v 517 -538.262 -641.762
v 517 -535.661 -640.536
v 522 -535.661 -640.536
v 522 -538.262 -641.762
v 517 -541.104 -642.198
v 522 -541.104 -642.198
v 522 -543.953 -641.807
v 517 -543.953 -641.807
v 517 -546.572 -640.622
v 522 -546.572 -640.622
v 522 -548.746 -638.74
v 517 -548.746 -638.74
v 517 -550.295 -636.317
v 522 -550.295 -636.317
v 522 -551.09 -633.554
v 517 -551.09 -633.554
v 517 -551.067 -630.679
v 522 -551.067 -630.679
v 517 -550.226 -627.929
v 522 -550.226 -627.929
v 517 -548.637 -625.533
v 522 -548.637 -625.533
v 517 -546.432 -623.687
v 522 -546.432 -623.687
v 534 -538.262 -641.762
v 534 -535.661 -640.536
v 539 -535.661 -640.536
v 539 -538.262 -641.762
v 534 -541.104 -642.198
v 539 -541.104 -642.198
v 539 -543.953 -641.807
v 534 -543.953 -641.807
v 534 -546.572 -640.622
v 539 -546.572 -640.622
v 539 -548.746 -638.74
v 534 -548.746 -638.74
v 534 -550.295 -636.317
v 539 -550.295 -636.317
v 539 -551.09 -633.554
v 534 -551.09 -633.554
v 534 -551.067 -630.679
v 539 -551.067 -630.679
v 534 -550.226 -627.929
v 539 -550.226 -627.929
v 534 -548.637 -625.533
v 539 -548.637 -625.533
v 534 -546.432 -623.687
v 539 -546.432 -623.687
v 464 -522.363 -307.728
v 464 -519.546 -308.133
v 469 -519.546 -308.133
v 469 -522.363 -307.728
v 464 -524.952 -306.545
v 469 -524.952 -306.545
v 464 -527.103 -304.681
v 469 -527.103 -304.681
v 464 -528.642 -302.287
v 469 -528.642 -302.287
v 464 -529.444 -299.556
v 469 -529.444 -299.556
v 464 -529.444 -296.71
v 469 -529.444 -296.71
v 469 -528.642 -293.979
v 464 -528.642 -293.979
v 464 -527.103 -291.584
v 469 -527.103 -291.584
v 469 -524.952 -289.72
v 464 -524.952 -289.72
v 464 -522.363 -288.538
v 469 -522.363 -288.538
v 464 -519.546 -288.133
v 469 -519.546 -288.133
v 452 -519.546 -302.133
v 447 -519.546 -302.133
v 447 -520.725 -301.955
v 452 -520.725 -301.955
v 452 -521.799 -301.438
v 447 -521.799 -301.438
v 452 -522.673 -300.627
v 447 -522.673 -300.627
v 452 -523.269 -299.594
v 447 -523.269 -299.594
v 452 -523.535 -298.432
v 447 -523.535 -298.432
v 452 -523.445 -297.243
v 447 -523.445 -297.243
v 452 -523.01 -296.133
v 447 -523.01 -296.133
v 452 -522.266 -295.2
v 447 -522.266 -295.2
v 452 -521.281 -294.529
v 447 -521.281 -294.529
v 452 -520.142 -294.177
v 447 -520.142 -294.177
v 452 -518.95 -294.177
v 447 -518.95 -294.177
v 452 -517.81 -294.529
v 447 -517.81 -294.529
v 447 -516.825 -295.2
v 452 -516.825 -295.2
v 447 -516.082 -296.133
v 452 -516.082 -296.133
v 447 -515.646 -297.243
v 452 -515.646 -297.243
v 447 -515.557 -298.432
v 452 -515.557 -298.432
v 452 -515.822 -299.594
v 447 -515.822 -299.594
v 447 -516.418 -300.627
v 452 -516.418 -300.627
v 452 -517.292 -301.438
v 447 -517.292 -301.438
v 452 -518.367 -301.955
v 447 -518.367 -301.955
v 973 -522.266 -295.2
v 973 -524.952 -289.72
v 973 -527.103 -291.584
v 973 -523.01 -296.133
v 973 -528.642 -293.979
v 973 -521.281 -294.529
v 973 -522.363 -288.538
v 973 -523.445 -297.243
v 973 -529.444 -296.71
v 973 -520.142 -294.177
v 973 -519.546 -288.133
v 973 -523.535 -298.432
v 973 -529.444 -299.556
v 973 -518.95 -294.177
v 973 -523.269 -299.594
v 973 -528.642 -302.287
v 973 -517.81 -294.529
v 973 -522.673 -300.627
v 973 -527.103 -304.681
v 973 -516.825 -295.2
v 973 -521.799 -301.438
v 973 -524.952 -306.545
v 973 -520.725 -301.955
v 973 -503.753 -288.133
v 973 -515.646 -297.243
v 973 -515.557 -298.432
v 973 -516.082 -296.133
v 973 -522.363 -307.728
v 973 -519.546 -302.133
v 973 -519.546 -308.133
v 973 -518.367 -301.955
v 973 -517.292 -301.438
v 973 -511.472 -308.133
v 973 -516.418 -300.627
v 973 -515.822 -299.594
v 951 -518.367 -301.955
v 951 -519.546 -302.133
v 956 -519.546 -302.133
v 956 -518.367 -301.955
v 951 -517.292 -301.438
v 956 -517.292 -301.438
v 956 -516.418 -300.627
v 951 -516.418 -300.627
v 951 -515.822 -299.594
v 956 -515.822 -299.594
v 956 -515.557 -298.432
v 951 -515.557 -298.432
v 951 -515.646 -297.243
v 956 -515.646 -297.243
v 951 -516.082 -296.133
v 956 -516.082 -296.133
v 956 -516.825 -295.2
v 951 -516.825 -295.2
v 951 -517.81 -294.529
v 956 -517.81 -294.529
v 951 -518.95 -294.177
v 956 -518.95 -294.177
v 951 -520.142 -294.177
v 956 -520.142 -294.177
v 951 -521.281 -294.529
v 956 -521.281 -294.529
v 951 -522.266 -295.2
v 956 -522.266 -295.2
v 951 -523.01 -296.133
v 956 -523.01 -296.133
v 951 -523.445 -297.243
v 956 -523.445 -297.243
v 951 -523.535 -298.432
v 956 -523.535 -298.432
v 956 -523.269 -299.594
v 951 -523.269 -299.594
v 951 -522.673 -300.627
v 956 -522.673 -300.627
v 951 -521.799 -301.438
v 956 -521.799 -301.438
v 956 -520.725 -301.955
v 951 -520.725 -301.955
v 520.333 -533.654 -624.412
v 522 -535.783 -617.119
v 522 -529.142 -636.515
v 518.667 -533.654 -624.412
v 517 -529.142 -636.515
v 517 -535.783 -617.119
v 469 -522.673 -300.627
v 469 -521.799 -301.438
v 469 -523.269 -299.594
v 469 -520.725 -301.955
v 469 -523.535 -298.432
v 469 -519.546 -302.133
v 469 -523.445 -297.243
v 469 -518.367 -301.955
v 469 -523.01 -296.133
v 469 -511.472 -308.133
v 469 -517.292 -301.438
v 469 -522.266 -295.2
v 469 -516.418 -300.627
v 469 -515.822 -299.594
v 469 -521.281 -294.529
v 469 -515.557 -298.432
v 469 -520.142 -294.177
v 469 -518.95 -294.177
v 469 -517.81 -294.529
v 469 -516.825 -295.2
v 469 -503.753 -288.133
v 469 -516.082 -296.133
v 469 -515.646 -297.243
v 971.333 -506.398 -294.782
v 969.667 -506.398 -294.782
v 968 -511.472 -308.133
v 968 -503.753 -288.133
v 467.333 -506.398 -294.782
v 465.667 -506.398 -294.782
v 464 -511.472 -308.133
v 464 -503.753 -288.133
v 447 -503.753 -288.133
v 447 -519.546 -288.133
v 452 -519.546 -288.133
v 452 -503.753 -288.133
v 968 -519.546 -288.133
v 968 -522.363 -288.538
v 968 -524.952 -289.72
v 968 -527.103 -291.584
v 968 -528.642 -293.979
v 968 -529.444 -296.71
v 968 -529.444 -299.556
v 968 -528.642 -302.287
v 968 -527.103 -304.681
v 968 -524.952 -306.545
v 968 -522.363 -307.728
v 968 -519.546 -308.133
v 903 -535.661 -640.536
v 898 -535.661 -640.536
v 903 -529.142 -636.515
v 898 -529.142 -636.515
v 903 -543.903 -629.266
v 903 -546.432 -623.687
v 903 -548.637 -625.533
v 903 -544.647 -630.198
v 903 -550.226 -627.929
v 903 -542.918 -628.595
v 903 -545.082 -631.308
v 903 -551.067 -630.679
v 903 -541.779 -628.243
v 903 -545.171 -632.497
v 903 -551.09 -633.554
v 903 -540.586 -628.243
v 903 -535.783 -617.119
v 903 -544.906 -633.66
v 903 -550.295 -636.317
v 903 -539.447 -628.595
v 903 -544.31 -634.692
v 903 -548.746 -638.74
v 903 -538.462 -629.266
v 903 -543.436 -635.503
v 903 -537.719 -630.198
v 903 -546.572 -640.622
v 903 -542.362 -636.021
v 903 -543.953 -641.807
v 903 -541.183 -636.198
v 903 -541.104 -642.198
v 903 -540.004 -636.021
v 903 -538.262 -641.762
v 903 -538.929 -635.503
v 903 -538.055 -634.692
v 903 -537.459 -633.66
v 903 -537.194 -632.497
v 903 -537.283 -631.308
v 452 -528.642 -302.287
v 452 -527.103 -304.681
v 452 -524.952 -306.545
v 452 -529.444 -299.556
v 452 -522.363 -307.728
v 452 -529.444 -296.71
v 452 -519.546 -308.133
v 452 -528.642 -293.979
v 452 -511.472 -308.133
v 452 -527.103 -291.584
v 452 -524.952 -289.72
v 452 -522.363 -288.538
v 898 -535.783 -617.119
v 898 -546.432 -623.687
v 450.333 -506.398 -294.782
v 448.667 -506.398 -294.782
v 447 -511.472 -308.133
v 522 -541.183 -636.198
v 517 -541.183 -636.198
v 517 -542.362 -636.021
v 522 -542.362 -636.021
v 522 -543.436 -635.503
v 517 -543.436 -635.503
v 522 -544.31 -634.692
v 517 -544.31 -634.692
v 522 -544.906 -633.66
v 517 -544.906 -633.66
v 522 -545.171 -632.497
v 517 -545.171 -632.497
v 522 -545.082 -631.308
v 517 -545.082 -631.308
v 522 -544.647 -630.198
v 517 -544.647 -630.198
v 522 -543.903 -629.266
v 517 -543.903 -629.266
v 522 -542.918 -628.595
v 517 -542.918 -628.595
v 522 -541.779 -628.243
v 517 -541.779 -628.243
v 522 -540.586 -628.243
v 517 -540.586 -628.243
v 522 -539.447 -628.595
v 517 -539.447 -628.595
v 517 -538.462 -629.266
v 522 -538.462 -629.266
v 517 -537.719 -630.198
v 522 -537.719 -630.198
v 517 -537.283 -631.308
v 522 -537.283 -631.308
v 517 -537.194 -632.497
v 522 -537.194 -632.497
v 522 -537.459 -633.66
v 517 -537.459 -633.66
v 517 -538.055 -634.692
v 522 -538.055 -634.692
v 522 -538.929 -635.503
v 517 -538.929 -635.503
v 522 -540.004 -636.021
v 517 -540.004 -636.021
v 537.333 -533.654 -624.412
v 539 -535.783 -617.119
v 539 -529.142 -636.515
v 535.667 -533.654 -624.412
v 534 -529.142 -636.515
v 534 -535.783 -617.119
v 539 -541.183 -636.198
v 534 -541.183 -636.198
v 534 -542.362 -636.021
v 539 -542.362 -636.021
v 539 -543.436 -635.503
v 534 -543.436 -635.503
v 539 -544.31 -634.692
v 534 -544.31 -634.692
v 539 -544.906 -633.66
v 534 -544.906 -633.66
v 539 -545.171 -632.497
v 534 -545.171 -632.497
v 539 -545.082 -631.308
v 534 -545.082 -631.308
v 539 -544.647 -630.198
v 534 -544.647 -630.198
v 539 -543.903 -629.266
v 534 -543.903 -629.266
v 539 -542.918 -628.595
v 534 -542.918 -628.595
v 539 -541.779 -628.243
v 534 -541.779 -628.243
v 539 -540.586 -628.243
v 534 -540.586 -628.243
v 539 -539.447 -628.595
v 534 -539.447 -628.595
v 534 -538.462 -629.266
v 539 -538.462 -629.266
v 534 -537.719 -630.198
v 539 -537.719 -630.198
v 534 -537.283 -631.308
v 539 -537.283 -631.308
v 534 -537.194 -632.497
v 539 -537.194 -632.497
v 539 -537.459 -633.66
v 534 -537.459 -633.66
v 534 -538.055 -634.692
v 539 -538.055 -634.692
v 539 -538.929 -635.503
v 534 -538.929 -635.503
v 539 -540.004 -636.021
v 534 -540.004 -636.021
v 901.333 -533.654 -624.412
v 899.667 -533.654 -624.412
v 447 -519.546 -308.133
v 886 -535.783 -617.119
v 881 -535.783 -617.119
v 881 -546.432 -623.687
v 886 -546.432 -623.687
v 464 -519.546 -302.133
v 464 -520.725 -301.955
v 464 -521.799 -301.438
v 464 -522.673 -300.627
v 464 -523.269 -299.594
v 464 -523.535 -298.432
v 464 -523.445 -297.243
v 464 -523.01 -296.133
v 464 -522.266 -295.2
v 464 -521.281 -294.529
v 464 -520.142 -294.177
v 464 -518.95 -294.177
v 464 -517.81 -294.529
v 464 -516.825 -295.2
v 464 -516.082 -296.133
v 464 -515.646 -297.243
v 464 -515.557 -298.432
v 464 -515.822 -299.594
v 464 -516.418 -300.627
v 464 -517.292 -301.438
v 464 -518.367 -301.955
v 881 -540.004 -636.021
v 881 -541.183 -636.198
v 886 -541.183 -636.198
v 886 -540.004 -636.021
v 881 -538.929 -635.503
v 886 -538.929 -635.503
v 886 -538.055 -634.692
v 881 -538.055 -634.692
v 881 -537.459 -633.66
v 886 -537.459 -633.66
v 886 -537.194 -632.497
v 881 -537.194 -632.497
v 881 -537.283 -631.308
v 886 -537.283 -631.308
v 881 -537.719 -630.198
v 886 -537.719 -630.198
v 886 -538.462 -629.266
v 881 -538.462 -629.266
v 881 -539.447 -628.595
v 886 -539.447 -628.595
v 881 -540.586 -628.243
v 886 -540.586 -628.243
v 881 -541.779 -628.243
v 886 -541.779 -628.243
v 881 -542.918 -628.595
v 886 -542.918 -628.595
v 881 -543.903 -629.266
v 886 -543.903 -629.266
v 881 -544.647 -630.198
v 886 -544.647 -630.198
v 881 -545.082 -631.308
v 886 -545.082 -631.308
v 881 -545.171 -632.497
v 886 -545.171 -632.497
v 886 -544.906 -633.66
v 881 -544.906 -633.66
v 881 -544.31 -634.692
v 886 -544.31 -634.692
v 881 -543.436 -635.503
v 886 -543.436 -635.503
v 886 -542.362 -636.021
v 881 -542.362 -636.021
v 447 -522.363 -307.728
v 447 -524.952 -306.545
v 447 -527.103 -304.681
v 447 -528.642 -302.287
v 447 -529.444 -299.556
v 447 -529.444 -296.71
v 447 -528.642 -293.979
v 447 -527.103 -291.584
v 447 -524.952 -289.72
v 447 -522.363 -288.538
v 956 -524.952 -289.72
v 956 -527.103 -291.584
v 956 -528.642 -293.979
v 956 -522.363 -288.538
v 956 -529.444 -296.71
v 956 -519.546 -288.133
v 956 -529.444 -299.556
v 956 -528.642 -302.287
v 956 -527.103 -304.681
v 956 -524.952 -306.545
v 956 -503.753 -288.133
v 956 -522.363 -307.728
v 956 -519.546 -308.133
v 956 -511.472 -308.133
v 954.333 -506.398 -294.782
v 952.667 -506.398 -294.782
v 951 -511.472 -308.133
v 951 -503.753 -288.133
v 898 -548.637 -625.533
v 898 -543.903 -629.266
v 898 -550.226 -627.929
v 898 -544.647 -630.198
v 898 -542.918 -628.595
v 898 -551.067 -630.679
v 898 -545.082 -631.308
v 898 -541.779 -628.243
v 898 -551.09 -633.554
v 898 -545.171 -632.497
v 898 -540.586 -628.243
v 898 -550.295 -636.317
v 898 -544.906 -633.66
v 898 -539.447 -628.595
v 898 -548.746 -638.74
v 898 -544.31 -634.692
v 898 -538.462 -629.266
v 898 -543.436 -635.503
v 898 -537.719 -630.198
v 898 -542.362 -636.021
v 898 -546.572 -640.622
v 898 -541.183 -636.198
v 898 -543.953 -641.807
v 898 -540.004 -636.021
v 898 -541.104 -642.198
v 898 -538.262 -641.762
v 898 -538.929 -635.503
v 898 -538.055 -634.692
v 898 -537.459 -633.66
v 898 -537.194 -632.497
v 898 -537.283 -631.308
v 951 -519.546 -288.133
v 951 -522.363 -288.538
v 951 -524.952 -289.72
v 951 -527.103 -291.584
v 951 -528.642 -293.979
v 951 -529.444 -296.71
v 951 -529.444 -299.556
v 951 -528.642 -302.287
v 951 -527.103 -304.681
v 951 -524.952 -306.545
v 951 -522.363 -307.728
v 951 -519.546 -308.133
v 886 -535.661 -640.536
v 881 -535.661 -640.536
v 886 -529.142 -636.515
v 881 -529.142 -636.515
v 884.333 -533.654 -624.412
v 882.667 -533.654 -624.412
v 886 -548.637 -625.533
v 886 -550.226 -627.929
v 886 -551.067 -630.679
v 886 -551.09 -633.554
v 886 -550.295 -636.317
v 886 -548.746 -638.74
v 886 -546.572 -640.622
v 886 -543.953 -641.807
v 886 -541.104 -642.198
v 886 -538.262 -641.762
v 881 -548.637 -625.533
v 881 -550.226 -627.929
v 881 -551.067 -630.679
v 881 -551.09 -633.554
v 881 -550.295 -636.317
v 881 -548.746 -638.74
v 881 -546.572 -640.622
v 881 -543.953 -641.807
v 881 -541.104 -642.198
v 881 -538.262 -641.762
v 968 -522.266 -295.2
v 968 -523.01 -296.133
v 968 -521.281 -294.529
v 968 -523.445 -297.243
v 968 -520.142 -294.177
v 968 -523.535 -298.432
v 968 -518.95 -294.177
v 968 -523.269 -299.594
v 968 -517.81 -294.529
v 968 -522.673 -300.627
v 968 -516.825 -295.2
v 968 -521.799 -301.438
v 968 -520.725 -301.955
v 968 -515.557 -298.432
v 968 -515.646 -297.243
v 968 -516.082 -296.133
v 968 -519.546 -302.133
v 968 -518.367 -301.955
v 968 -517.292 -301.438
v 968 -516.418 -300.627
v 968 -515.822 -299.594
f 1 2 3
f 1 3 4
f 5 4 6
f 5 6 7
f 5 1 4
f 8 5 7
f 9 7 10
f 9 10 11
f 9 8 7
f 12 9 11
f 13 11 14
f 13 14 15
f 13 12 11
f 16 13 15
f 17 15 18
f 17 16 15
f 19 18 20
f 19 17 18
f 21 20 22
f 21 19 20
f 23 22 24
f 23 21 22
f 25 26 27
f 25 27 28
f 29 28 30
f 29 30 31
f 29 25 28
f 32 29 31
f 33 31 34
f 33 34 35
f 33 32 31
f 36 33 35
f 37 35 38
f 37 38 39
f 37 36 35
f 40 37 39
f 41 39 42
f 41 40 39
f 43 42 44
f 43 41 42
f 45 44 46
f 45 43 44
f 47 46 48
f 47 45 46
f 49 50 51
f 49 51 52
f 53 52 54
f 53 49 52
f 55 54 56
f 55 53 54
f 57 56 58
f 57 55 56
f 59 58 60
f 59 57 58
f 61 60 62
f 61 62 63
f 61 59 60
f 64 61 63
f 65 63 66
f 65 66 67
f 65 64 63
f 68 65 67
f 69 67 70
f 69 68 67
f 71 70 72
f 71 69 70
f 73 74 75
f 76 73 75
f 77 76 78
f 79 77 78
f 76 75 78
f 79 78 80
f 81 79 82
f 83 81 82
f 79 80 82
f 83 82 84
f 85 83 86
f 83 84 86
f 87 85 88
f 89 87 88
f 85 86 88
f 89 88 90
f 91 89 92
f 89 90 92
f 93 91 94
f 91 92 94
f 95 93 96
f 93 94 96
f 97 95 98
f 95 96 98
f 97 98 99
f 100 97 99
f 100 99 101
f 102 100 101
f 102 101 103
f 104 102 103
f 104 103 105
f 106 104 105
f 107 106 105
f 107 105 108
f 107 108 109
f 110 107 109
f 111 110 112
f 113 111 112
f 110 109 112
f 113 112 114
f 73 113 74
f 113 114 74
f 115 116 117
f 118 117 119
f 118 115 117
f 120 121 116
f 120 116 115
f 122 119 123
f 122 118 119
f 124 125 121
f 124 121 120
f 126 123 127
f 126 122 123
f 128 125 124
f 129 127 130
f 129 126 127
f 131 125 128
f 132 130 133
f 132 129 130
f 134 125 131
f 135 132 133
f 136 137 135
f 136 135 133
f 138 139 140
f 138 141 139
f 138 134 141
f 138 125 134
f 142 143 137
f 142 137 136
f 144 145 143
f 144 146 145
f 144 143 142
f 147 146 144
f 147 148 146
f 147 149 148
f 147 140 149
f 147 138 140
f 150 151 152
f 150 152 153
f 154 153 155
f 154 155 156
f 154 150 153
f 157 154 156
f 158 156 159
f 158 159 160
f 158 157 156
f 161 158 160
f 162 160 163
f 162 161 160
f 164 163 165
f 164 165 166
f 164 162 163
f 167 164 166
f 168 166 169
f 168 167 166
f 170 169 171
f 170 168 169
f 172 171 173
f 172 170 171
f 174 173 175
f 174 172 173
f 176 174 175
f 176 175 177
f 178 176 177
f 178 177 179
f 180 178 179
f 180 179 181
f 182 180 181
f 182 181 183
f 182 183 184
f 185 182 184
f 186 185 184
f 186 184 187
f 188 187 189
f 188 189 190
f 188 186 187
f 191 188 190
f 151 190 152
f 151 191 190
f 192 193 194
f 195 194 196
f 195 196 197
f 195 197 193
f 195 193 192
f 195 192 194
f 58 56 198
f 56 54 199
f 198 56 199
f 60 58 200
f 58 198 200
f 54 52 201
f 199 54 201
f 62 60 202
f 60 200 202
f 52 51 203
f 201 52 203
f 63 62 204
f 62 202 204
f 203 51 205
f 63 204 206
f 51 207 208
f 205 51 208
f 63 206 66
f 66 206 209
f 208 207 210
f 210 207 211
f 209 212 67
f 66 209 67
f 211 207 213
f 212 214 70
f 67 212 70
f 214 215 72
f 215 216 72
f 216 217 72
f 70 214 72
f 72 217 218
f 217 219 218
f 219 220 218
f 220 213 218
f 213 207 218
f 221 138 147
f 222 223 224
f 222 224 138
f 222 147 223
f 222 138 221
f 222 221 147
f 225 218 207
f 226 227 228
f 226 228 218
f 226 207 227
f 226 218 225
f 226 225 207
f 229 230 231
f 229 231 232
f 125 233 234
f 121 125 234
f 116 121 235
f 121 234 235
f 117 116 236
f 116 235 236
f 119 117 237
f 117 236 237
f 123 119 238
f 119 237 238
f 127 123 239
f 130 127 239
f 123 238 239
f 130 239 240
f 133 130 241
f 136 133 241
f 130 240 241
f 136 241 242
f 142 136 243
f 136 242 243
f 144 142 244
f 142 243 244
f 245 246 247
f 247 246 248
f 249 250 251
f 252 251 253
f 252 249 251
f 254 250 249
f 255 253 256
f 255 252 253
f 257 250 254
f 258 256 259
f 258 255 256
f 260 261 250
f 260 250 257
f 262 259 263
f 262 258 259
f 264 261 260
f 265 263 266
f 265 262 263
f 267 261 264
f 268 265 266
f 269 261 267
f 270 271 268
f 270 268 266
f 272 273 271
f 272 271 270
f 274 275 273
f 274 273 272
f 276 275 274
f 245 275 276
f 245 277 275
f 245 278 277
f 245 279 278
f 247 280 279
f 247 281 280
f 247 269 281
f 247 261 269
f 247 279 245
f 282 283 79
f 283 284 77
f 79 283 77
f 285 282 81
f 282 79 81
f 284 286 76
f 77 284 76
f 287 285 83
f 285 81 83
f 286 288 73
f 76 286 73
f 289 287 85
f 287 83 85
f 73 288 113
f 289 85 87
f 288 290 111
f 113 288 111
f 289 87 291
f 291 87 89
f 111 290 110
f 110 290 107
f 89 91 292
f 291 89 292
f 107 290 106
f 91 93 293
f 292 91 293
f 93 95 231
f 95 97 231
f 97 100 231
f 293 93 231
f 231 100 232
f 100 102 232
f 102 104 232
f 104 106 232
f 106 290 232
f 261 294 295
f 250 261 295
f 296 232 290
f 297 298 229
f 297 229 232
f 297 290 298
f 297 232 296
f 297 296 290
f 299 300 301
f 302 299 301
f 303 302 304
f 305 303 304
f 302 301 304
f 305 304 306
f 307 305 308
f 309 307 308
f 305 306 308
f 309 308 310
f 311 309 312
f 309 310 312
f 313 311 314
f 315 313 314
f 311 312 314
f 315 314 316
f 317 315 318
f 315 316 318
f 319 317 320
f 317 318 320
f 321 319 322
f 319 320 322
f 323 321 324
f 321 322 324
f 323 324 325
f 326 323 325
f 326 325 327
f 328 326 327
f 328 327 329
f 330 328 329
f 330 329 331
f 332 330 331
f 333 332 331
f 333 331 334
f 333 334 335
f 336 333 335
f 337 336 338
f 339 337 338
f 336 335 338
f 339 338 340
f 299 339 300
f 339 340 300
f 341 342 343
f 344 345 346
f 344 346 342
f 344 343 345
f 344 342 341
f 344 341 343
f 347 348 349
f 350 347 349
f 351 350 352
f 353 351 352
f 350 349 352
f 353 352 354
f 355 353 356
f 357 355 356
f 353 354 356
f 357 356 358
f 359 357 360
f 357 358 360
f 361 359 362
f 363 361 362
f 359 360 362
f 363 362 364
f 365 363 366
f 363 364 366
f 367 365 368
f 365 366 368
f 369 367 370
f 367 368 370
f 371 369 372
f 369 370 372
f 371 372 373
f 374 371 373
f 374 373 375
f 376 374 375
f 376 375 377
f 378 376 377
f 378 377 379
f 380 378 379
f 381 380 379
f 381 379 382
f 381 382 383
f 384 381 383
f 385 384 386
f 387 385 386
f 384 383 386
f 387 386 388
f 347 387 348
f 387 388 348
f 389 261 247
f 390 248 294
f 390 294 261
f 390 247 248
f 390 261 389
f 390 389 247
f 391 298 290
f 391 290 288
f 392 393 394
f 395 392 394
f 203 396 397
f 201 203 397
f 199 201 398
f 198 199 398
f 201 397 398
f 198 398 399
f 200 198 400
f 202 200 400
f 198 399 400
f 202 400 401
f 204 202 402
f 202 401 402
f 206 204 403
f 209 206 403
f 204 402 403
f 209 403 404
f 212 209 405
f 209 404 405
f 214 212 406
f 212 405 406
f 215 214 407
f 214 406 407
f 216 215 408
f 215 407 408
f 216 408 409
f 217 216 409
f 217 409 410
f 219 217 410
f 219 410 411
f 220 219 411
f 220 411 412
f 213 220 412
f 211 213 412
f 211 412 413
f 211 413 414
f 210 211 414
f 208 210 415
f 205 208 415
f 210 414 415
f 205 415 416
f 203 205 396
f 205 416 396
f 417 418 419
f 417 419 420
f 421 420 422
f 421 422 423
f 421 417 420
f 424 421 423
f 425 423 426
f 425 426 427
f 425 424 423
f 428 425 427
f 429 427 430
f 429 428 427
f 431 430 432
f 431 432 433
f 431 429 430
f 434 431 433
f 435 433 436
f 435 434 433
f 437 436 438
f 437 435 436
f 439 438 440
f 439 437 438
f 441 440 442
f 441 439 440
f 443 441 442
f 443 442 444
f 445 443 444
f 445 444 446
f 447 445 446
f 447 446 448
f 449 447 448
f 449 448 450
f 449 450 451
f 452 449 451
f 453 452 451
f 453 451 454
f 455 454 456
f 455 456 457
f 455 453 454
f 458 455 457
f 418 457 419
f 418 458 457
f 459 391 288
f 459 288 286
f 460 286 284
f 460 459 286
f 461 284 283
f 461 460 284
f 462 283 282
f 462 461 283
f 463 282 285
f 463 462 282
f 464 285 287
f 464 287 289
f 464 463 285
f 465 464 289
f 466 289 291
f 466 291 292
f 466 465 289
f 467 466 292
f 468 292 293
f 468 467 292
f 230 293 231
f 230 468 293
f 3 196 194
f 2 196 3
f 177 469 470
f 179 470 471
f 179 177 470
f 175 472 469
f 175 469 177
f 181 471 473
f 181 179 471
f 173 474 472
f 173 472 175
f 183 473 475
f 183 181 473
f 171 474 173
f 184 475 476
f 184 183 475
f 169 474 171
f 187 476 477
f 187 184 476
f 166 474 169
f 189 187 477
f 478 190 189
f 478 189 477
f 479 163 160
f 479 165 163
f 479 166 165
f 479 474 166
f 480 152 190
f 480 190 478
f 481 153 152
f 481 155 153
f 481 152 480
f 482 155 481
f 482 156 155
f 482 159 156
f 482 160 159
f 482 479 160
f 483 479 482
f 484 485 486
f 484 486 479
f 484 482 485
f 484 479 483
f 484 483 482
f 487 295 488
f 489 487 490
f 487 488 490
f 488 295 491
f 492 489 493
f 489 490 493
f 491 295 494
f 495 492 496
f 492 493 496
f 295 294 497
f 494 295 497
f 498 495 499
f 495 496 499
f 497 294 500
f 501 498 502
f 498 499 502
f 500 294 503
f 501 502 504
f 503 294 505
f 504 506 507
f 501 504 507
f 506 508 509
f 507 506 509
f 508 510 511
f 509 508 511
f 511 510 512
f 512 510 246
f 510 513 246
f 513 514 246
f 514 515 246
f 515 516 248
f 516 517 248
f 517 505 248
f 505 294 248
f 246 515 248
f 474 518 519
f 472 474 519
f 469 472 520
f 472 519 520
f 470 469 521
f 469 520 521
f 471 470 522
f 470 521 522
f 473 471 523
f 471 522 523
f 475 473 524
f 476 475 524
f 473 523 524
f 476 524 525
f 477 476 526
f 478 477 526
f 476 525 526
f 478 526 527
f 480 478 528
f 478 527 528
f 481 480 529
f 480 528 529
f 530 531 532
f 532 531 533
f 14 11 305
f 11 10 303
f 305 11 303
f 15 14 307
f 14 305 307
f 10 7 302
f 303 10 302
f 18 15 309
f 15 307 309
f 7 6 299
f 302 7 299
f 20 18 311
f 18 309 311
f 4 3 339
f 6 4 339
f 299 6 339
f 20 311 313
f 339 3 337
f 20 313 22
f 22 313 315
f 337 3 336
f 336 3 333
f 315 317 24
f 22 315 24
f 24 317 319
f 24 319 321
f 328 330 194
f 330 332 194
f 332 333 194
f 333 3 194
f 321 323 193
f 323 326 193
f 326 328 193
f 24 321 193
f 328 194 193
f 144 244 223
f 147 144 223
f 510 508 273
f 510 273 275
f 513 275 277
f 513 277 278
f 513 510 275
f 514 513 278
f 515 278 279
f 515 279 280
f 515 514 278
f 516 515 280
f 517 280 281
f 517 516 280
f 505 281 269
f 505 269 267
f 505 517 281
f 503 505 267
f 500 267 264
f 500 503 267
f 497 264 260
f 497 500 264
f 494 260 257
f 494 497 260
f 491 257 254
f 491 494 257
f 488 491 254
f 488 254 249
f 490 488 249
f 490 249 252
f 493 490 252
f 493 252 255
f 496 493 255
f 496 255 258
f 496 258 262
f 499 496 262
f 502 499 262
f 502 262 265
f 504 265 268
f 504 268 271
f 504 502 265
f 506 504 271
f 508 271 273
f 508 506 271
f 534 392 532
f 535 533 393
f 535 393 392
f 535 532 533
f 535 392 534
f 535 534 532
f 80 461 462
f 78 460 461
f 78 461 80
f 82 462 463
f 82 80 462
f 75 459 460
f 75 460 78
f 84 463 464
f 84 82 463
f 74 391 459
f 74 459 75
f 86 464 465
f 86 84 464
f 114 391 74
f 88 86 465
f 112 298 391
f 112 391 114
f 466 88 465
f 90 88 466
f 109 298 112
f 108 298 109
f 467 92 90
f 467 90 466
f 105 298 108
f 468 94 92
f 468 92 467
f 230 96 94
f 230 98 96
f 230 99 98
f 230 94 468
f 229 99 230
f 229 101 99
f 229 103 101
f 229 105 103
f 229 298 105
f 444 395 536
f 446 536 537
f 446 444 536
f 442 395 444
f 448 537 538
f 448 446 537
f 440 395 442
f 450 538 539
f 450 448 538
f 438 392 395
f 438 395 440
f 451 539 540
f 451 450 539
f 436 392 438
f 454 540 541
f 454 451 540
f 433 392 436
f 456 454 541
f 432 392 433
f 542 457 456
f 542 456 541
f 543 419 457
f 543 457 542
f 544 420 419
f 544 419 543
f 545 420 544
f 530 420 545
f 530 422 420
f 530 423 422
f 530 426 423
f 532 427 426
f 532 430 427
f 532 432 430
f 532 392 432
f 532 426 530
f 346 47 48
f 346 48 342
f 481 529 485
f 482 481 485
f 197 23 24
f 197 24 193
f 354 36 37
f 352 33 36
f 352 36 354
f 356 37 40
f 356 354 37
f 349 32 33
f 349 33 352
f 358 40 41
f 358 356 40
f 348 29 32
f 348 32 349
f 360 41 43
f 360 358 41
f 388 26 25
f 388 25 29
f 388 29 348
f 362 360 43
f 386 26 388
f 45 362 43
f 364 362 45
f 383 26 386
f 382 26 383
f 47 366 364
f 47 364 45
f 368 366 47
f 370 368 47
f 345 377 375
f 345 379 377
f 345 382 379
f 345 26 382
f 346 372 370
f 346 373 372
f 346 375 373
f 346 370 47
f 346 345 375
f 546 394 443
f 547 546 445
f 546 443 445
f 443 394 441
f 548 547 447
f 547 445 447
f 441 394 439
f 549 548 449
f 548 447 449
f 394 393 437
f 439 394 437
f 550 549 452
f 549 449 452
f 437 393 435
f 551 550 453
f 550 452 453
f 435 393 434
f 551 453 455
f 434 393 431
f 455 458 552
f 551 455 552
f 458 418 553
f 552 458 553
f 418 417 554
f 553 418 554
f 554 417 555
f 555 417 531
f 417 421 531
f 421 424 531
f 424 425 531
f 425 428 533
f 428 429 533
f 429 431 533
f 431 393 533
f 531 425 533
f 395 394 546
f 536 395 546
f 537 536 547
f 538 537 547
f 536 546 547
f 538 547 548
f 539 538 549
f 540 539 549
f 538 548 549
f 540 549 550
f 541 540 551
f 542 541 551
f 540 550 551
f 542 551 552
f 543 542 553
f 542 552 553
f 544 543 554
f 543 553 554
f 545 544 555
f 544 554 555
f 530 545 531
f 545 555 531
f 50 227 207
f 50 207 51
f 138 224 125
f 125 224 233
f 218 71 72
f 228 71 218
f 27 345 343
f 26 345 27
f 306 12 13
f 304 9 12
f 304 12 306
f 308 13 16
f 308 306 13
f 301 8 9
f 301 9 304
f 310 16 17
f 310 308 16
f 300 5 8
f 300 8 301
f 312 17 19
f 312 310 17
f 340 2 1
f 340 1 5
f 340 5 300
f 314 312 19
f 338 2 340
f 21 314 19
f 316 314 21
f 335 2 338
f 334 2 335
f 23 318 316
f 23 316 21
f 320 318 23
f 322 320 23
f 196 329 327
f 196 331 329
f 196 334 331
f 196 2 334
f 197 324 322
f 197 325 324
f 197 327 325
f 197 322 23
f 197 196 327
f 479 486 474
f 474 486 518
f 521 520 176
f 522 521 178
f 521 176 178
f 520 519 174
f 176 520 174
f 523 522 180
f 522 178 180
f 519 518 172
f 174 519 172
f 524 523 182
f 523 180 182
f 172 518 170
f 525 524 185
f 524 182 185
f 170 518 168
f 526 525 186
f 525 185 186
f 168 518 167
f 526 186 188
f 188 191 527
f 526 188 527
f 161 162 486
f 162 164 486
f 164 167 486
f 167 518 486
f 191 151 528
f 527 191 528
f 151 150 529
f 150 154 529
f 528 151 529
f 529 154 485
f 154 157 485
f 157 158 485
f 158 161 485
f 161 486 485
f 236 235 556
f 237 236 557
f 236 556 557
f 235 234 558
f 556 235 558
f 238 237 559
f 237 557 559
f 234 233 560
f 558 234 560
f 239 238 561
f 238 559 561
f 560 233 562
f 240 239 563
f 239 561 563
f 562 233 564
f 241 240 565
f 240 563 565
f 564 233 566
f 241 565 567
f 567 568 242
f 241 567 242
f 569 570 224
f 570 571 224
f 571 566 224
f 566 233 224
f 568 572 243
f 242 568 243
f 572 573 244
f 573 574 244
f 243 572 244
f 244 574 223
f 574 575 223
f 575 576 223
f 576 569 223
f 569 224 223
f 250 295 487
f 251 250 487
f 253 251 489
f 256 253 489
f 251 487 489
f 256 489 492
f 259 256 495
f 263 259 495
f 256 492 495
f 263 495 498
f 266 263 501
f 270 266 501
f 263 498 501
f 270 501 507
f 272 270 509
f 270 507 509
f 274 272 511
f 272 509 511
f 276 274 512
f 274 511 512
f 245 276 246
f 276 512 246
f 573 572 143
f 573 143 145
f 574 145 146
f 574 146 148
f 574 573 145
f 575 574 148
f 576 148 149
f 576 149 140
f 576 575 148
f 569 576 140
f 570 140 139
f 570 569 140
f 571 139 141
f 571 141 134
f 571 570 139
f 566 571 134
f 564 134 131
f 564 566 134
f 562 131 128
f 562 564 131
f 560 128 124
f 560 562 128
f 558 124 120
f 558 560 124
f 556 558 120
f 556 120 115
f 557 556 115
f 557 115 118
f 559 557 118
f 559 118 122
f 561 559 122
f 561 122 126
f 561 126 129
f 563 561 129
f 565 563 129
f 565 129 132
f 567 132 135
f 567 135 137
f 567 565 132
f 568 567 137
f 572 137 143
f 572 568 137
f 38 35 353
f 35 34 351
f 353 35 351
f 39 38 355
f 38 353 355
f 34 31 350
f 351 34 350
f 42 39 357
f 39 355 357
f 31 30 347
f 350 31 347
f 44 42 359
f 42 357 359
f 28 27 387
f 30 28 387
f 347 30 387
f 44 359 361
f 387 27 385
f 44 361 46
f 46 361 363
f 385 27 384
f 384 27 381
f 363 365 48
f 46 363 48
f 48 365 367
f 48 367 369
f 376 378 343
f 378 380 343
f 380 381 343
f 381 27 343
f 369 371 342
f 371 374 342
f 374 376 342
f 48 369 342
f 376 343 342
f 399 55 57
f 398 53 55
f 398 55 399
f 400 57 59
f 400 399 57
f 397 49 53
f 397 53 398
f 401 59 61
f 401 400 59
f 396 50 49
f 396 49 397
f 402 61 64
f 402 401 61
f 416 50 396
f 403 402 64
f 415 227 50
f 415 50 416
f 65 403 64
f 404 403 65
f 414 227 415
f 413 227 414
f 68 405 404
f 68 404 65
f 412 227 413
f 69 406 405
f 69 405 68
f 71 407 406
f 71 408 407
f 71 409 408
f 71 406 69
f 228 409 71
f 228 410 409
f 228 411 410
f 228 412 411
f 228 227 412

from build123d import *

# Parameters (mm, degrees)
BOSS_EXTRUDE1_DEPTH  = 10
BOSS_EXTRUDE2_DEPTH  = 1400
SPLIT2_DEPTH         = 10
SKETCH4_R            = 4
BOSS_EXTRUDE3_DEPTH  = 5
BOSS_EXTRUDE4_START  = -5
SKETCH5_R            = 4
BOSS_EXTRUDE4_DEPTH  = 5
BOSS_EXTRUDE5_START  = 5
SKETCH6_R            = 4
BOSS_EXTRUDE5_DEPTH  = 5
SKETCH7_R            = 4
BOSS_EXTRUDE6_DEPTH  = 5
SKETCH8_R            = 4
BOSS_EXTRUDE7_DEPTH  = 5
BOSS_EXTRUDE8_START  = -5
SKETCH9_R            = 4
BOSS_EXTRUDE8_DEPTH  = 5
SKETCH10_R           = 4
BOSS_EXTRUDE9_DEPTH  = 5
BOSS_EXTRUDE10_START = 5
SKETCH11_R           = 4
BOSS_EXTRUDE10_DEPTH = 5
SPLIT3_START         = 10
SPLIT3_DEPTH         = 1400


# Read off the part's stored shape, not the designer's step: Split2, Split3
with BuildPart() as part:
    # Sketch1 → Boss-Extrude1 (new body)
    with BuildSketch(Plane(origin=(0, 0, 0), x_dir=(0, 0, -1), z_dir=(1, 0, 0))):
        with BuildLine():
            Line((0, -39.159060238), (0, -399.159060238))
            ThreePointArc((0, -399.159060238), (2.810766389, -411.83760809), (10.716371709, -422.140393531))
            Line((10.716371709, -422.140393531), (202.227482489, -582.837295953))
            ThreePointArc((202.227482489, -582.837295953), (211.25050648, -588.046741283), (221.51111078, -589.855962659))
            Line((221.51111078, -589.855962659), (671.51111078, -589.855962659))
            ThreePointArc((671.51111078, -589.855962659), (692.724314215, -581.069166095), (701.51111078, -559.855962659))
            Line((701.51111078, -559.855962659), (701.51111078, -369.855962659))
            ThreePointArc((701.51111078, -369.855962659), (700.081380744, -360.705024227), (695.928465834, -352.426310564))
            Line((695.928465834, -352.426310564), (556.491249073, -157.087470131))
            ThreePointArc((556.491249073, -157.087470131), (549.188422732, -149.877866821), (539.883012979, -145.551320648))
            Line((539.883012979, -145.551320648), (37.809118961, -10.19325866))
            ThreePointArc((37.809118961, -10.19325866), (11.755460664, -15.344426409), (0, -39.159060238))
        make_face()
    extrude(amount=BOSS_EXTRUDE1_DEPTH)

    # Sketch2 → Boss-Extrude2 (add)
    with BuildSketch(Plane(origin=(10, 0, 0), x_dir=(0, 0, -1), z_dir=(1, 0, 0))):
        with BuildLine():
            ThreePointArc((626.364411935, -475.947865394), (654.270375926, -492.315038086), (646.133694128, -523.626722446))
            add(Edge.make_bspline(
                [(646.133694128, -523.626722446), (620.265200397, -544.090123727), (324.808789115, -589.015611509), (14.475713482, -342.918185901), (34.207392898, -327.560917886)],
                knots=[0, 0, 0, 0, 0.454280693, 1, 1, 1, 1], degree=3))
            ThreePointArc((34.207392898, -327.560917886), (38.301805286, -326.1553415), (42.396217675, -327.560917886))
            add(Edge.make_bspline(
                [(42.396217675, -327.560917886), (179.998241324, -434.657283692), (369.496171973, -510.067463814), (572.427382245, -482.279425386), (626.364411935, -475.947865394)],
                knots=[0, 0, 0, 0, 0.742688993, 1, 1, 1, 1], degree=3))
        make_face()
        with BuildLine():
            ThreePointArc((66.698936736, -215.359019498), (67.092959072, -208.260098077), (74.202765192, -208.284508838))
            add(Edge.make_bspline(
                [(74.202765192, -208.284508838), (81.149231878, -214.924232147), (316.076431581, -369.790908175), (526.742508558, -357.109499901), (567.085033992, -348.175125638)],
                knots=[0, 0, 0, 0, 0.768435057, 1, 1, 1, 1], degree=3))
            ThreePointArc((567.085033992, -348.175125638), (594.800287265, -365.58541059), (577.755509271, -393.526935767))
            add(Edge.make_bspline(
                [(66.698936736, -215.359019498), (100.320017518, -254.957400328), (300.322217315, -390.035120939), (509.639726303, -410.500517765), (577.755509271, -393.526935767)],
                knots=[0, 0, 0, 0, 0.654710405, 1, 1, 1, 1], degree=3))
        make_face()
        with BuildLine():
            ThreePointArc((92.163413905, -98.198220596), (93.433821546, -92.827514339), (98.829146805, -93.988930122))
            add(Edge.make_bspline(
                [(98.829146805, -93.988930122), (112.622758483, -114.88285895), (192.730208888, -182.13783781), (300.184384568, -194.688304583), (331.179728441, -194.685467652)],
                knots=[0, 0, 0, 0, 0.660882752, 1, 1, 1, 1], degree=3))
            ThreePointArc((331.179728441, -194.685467652), (341.545058852, -204.318697463), (332.693478174, -215.359019498))
            add(Edge.make_bspline(
                [(92.163413905, -98.198220596), (126.325036043, -154.802617957), (226.918714052, -224.562098265), (331.921739283, -215.472572374), (332.693478174, -215.359019498)],
                knots=[0, 0, 0, 0, 0.645739259, 1, 1, 1, 1], degree=3))
        make_face()
    extrude(amount=BOSS_EXTRUDE2_DEPTH)

    # Split2 outline → Split2 (cut)
    with BuildSketch(Plane.YZ):
        with BuildLine():
            ThreePointArc((-157.087470131, -556.491249073), (-149.877866821, -549.188422732), (-145.551320648, -539.883012979))
            Line((-145.551320648, -539.883012979), (-10.19325866, -37.809118961))
            ThreePointArc((-10.19325866, -37.809118961), (-15.344426409, -11.755460664), (-39.159060238, 0))
            Line((-39.159060238, 0), (-399.159060238, 0))
            ThreePointArc((-399.159060238, 0), (-411.83760809, -2.810766389), (-422.140393531, -10.716371709))
            Line((-422.140393531, -10.716371709), (-582.837295953, -202.227482489))
            ThreePointArc((-582.837295953, -202.227482489), (-588.046741283, -211.25050648), (-589.855962659, -221.51111078))
            Line((-589.855962659, -221.51111078), (-589.855962659, -671.51111078))
            ThreePointArc((-589.855962659, -671.51111078), (-581.069166095, -692.724314215), (-559.855962659, -701.51111078))
            Line((-559.855962659, -701.51111078), (-369.855962659, -701.51111078))
            ThreePointArc((-369.855962659, -701.51111078), (-360.705024227, -700.081380744), (-352.426310564, -695.928465834))
            Line((-352.426310564, -695.928465834), (-157.087470131, -556.491249073))
        make_face()
    extrude(amount=SPLIT2_DEPTH, mode=Mode.SUBTRACT)

    # Sketch4 → Boss-Extrude3 (add)
    with BuildSketch(Plane(origin=(968, 0, 0), x_dir=(0, 0, -1), z_dir=(1, 0, 0))):
        with BuildLine():
            Line((288.132678683, -503.125593865), (288.132678683, -519.545737388))
            ThreePointArc((288.132678683, -519.545737388), (298.132678683, -529.545737388), (308.132678683, -519.545737388))
            Line((308.132678683, -519.545737388), (308.132678683, -511.471886152))
            add(Edge.make_bspline(
                [(288.132678683, -503.125593865), (294.10320056, -505.512610704), (308.132678683, -511.471886152)],
                knots=[0, 0, 0, 1, 1, 1], degree=2))
        make_face()
        with Locations((298.132678683, -519.545737388)):
            Circle(SKETCH4_R, mode=Mode.SUBTRACT)
    extrude(amount=BOSS_EXTRUDE3_DEPTH)

    # Sketch5 → Boss-Extrude4 (add)
    with BuildSketch(Plane(origin=(956, 0, 0), x_dir=(0, 0, -1), z_dir=(1, 0, 0)).offset(BOSS_EXTRUDE4_START)):
        with BuildLine():
            Line((288.132678683, -503.125593865), (288.132678683, -519.545737388))
            ThreePointArc((288.132678683, -519.545737388), (298.132678683, -529.545737388), (308.132678683, -519.545737388))
            Line((308.132678683, -519.545737388), (308.132678683, -511.471886152))
            add(Edge.make_bspline(
                [(308.132678683, -511.471886152), (294.103200562, -505.512610705), (288.132678683, -503.125593865)],
                knots=[0, 0, 0, 1, 1, 1], degree=2))
        make_face()
        with Locations((298.132678683, -519.545737388)):
            Circle(SKETCH5_R, mode=Mode.SUBTRACT)
    extrude(amount=BOSS_EXTRUDE4_DEPTH)

    # Sketch6 → Boss-Extrude5 (add)
    with BuildSketch(Plane.ZY.offset(-452).offset(BOSS_EXTRUDE5_START)):
        with BuildLine():
            Line((-288.132678683, -519.545737388), (-288.132678683, -503.125593865))
            add(Edge.make_bspline(
                [(-288.132678683, -503.125593865), (-294.103200562, -505.512610705), (-308.132678683, -511.471886152)],
                knots=[0, 0, 0, 1, 1, 1], degree=2))
            Line((-308.132678683, -511.471886152), (-308.132678683, -519.545737388))
            ThreePointArc((-308.132678683, -519.545737388), (-298.132678683, -529.545737388), (-288.132678683, -519.545737388))
        make_face()
        with Locations(Location((-298.132678683, -519.545737388, 0), (0, 0, 180))):
            Circle(SKETCH6_R, mode=Mode.SUBTRACT)
    extrude(amount=-BOSS_EXTRUDE5_DEPTH)

    # Sketch7 → Boss-Extrude6 (add)
    with BuildSketch(Plane.ZY.offset(-464)):
        with BuildLine():
            Line((-288.132678683, -519.545737388), (-288.132678683, -503.125593865))
            add(Edge.make_bspline(
                [(-288.132678683, -503.125593865), (-294.103200562, -505.512610705), (-308.132678683, -511.471886152)],
                knots=[0, 0, 0, 1, 1, 1], degree=2))
            Line((-308.132678683, -511.471886152), (-308.132678683, -519.545737388))
            ThreePointArc((-308.132678683, -519.545737388), (-298.132678683, -529.545737388), (-288.132678683, -519.545737388))
        make_face()
        with Locations(Location((-298.132678683, -519.545737388, 0), (0, 0, 180))):
            Circle(SKETCH7_R, mode=Mode.SUBTRACT)
    extrude(amount=-BOSS_EXTRUDE6_DEPTH)

    # Sketch8 → Boss-Extrude7 (add)
    with BuildSketch(Plane(origin=(898, 0, 0), x_dir=(0, 0, -1), z_dir=(1, 0, 0))):
        with BuildLine():
            Line((617.1189132, -535.783369671), (623.687203666, -546.432337306))
            ThreePointArc((623.687203666, -546.432337306), (637.584554422, -549.608142918), (640.536054647, -535.661431988))
            Line((640.536054647, -535.661431988), (636.514752084, -529.141817628))
            Line((636.514752084, -529.141817628), (617.1189132, -535.783369671))
        make_face()
        with Locations((632.198402735, -541.182623942)):
            Circle(SKETCH8_R, mode=Mode.SUBTRACT)
    extrude(amount=BOSS_EXTRUDE7_DEPTH)

    # Sketch9 → Boss-Extrude8 (add)
    with BuildSketch(Plane(origin=(886, 0, 0), x_dir=(0, 0, -1), z_dir=(1, 0, 0)).offset(BOSS_EXTRUDE8_START)):
        with BuildLine():
            Line((617.1189132, -535.783369671), (623.687203666, -546.432337306))
            ThreePointArc((623.687203666, -546.432337306), (637.584554422, -549.608142918), (640.536054647, -535.661431988))
            Line((640.536054647, -535.661431988), (636.514752084, -529.141817628))
            Line((636.514752084, -529.141817628), (617.1189132, -535.783369671))
        make_face()
        with Locations((632.198402735, -541.182623942)):
            Circle(SKETCH9_R, mode=Mode.SUBTRACT)
    extrude(amount=BOSS_EXTRUDE8_DEPTH)

    # Sketch10 → Boss-Extrude9 (add)
    with BuildSketch(Plane.ZY.offset(-534)):
        with BuildLine():
            Line((-623.687203666, -546.432337306), (-617.1189132, -535.783369671))
            Line((-617.1189132, -535.783369671), (-636.514752084, -529.141817628))
            Line((-636.514752084, -529.141817628), (-640.536054647, -535.661431988))
            ThreePointArc((-640.536054647, -535.661431988), (-637.584554422, -549.608142918), (-623.687203666, -546.432337306))
        make_face()
        with Locations(Location((-632.198402735, -541.182623942, 0), (0, 0, 180))):
            Circle(SKETCH10_R, mode=Mode.SUBTRACT)
    extrude(amount=-BOSS_EXTRUDE9_DEPTH)

    # Sketch11 → Boss-Extrude10 (add)
    with BuildSketch(Plane.ZY.offset(-522).offset(BOSS_EXTRUDE10_START)):
        with BuildLine():
            Line((-623.687203666, -546.432337306), (-617.1189132, -535.783369671))
            Line((-617.1189132, -535.783369671), (-636.514752084, -529.141817628))
            Line((-636.514752084, -529.141817628), (-640.536054647, -535.661431988))
            ThreePointArc((-640.536054647, -535.661431988), (-637.584554422, -549.608142918), (-623.687203666, -546.432337306))
        make_face()
        with Locations(Location((-632.198402735, -541.182623942, 0), (0, 0, 180))):
            Circle(SKETCH11_R, mode=Mode.SUBTRACT)
    extrude(amount=-BOSS_EXTRUDE10_DEPTH)

    # Split3 outline → Split3 (cut)
    with BuildSketch(Plane.YZ.offset(SPLIT3_START)):
        with BuildLine():
            add(Edge.make_bspline(
                [(-511.471886152, -308.132678683), (-516.43969624, -321.631784584), (-557.088541152, -444.350129763), (-549.96236653, -564.626286038), (-535.783369672, -617.1189132)],
                knots=[0.500894987, 0.500894987, 0.500894987, 0.500894987, 0.545719307, 0.906064579, 0.906064579, 0.906064579, 0.906064579], degree=3))
            add(Edge.make_bspline(
                [(-535.783369672, -617.1189132), (-533.706392576, -624.808172558), (-531.461165575, -631.328504266), (-529.14181754, -636.51475228)],
                knots=[0.906064579, 0.906064579, 0.906064579, 0.906064579, 0.958848911, 0.958848911, 0.958848911, 0.958848911], degree=3))
            add(Edge.make_bspline(
                [(-529.14181754, -636.51475228), (-527.333635229, -640.557992803), (-525.480402933, -643.790392475), (-523.626722446, -646.133694128)],
                knots=[0.958848911, 0.958848911, 0.958848911, 0.958848911, 1, 1, 1, 1], degree=3))
            ThreePointArc((-523.626722446, -646.133694128), (-492.315038086, -654.270375926), (-475.947865394, -626.364411935))
            add(Edge.make_bspline(
                [(-475.947865394, -626.364411935), (-482.279425386, -572.427382245), (-510.067463814, -369.496171973), (-434.657283692, -179.998241324), (-327.560917886, -42.396217675)],
                knots=[0, 0, 0, 0, 0.257311007, 1, 1, 1, 1], degree=3))
            ThreePointArc((-327.560917886, -42.396217675), (-326.1553415, -38.301805286), (-327.560917886, -34.207392898))
            add(Edge.make_bspline(
                [(-327.560917886, -34.207392898), (-341.031625272, -16.899647836), (-446.017106891, -145.075235312), (-503.752882851, -288.132678683)],
                knots=[0, 0, 0, 0, 0.478680524, 0.478680524, 0.478680524, 0.478680524], degree=3))
            add(Edge.make_bspline(
                [(-503.752882851, -288.132678683), (-506.432267483, -294.771645752), (-509.009891619, -301.442663498), (-511.471886152, -308.132678683)],
                knots=[0.478680524, 0.478680524, 0.478680524, 0.478680524, 0.500894987, 0.500894987, 0.500894987, 0.500894987], degree=3))
        make_face()
        with BuildLine():
            ThreePointArc((-93.988930122, -98.829146805), (-92.827514339, -93.433821546), (-98.198220596, -92.163413905))
            add(Edge.make_bspline(
                [(-98.198220596, -92.163413905), (-154.802617957, -126.325036043), (-224.562098265, -226.918714052), (-215.472572374, -331.921739283), (-215.359019498, -332.693478174)],
                knots=[0, 0, 0, 0, 0.645739259, 1, 1, 1, 1], degree=3))
            ThreePointArc((-215.359019498, -332.693478174), (-204.318697463, -341.545058852), (-194.685467652, -331.179728441))
            add(Edge.make_bspline(
                [(-194.685467652, -331.179728441), (-194.688304583, -300.184384568), (-182.13783781, -192.730208888), (-114.88285895, -112.622758483), (-93.988930122, -98.829146805)],
                knots=[0, 0, 0, 0, 0.339117248, 1, 1, 1, 1], degree=3))
        make_face()
        with BuildLine():
            ThreePointArc((-208.284508838, -74.202765192), (-208.260098077, -67.092959072), (-215.359019498, -66.698936736))
            add(Edge.make_bspline(
                [(-215.359019498, -66.698936736), (-254.957400328, -100.320017518), (-390.035120939, -300.322217315), (-410.500517765, -509.639726303), (-393.526935767, -577.755509271)],
                knots=[0, 0, 0, 0, 0.654710405, 1, 1, 1, 1], degree=3))
            ThreePointArc((-393.526935767, -577.755509271), (-365.58541059, -594.800287265), (-348.175125638, -567.085033992))
            add(Edge.make_bspline(
                [(-348.175125638, -567.085033992), (-357.109499901, -526.742508558), (-369.790908175, -316.076431581), (-214.924232147, -81.149231878), (-208.284508838, -74.202765192)],
                knots=[0, 0, 0, 0, 0.231564943, 1, 1, 1, 1], degree=3))
        make_face()
    extrude(amount=SPLIT3_DEPTH, mode=Mode.SUBTRACT)


solid = part.part
